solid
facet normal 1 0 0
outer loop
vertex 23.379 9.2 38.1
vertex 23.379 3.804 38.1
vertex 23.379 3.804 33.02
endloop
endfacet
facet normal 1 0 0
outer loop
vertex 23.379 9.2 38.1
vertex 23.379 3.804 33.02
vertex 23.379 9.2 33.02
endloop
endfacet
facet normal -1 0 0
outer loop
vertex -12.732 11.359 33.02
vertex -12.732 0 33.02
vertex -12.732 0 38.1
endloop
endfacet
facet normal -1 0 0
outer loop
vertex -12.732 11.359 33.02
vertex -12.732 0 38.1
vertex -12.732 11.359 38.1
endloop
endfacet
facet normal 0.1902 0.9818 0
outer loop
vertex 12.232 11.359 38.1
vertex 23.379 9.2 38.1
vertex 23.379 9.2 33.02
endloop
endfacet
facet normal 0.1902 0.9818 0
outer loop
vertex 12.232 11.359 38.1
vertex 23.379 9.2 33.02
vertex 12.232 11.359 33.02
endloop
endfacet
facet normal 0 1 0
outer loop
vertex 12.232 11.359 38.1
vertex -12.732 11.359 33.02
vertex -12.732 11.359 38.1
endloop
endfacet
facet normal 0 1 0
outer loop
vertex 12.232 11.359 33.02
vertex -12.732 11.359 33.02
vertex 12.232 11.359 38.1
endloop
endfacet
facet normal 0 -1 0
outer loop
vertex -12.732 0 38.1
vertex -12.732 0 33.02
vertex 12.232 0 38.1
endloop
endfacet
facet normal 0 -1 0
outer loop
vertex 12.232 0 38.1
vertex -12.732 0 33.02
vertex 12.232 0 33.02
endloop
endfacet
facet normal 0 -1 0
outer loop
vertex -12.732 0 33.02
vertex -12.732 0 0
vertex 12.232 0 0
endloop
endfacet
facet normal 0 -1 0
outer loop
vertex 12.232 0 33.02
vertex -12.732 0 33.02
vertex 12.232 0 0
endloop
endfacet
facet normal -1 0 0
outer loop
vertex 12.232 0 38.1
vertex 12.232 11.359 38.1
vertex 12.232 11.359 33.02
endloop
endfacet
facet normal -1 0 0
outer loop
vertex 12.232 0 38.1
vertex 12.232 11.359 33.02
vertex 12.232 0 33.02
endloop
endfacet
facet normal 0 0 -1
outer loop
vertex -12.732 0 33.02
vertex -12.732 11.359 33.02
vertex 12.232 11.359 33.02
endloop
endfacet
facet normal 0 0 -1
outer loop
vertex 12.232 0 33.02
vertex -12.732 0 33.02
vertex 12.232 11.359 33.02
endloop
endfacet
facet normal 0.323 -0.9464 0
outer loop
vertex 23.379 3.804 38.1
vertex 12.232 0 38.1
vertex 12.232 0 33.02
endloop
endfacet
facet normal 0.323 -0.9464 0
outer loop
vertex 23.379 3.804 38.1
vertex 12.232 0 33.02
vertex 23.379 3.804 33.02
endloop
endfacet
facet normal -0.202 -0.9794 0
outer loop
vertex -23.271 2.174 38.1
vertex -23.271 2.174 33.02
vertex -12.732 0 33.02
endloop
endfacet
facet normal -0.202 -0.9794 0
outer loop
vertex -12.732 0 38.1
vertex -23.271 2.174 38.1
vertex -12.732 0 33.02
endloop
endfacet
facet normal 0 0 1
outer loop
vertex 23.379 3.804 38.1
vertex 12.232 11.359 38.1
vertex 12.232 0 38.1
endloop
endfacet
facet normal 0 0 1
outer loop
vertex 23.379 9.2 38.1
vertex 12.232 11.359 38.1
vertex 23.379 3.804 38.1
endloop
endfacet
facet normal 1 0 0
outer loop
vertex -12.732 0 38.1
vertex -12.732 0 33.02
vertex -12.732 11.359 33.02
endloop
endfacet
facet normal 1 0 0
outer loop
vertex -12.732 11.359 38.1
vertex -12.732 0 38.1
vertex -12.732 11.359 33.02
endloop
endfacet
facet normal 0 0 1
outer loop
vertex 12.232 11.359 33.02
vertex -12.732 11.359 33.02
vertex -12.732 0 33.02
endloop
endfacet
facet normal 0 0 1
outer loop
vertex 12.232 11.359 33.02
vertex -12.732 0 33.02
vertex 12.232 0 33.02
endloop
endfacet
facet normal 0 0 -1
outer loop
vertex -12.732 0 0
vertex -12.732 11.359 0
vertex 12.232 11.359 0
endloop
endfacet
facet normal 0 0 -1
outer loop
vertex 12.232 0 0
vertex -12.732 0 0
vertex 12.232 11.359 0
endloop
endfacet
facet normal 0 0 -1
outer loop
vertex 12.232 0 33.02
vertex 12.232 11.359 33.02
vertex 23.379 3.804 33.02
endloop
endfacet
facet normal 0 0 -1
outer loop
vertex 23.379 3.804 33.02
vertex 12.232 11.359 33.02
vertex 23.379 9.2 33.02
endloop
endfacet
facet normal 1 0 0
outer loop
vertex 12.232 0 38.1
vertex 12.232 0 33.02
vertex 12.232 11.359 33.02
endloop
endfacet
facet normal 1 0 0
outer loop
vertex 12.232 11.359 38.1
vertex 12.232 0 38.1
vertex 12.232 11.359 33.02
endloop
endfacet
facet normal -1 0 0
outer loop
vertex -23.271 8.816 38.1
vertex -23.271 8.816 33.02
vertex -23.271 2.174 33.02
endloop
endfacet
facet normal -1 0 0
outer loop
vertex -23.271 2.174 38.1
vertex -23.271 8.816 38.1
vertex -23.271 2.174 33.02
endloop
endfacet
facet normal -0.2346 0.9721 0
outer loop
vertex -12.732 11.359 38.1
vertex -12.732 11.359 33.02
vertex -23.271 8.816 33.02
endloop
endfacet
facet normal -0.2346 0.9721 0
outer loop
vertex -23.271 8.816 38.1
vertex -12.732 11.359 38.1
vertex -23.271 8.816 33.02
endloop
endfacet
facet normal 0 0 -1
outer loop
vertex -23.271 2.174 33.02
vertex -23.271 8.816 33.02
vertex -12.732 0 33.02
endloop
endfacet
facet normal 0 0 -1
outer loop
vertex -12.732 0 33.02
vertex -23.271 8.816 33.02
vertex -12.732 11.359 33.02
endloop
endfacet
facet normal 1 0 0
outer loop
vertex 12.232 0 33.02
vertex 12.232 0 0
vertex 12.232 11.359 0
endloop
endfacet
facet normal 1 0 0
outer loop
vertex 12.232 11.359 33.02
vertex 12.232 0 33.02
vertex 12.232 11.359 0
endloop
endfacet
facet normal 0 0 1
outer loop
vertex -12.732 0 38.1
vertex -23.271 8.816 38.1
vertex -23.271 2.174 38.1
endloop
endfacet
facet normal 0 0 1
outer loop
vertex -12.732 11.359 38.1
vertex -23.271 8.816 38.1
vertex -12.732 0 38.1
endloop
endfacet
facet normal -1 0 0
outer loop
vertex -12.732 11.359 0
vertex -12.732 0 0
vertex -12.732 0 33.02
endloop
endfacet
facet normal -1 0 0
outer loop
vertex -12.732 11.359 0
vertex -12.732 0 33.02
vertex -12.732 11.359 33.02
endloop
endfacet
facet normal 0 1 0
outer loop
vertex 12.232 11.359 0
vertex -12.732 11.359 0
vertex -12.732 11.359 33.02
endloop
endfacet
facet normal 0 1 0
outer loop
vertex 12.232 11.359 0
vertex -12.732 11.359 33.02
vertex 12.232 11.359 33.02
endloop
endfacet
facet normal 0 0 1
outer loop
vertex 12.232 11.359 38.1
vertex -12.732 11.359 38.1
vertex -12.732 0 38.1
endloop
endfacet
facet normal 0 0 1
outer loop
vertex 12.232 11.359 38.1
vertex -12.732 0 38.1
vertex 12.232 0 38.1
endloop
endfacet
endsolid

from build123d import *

# Parameters (mm, degrees)
F0_W     = 24.964119
F0_H     = 11.358674
F1_DEPTH = 33.02
F3_DEPTH = 5.08
F4_W     = 24.964119
F4_H     = 11.358674
F5_DEPTH = 5.08
F7_DEPTH = 5.08


with BuildPart() as f1:
    # F0 (on Top) → F1 (new body)
    with BuildSketch(Plane.XY):
        with Locations((-0.24964, 5.679337)):
            Rectangle(F0_W, F0_H)
    extrude(amount=F1_DEPTH)


with BuildPart() as f3:
    # F2 (on face) → F3 (new body)
    with BuildSketch(Plane.XY.offset(33.02)):
        Polygon((-12.7317, 0), (-12.7317, 11.358674), (-23.270963, 8.816268), (-23.270963, 2.17388), align=None)
    extrude(amount=F3_DEPTH)


with BuildPart() as f5:
    # F4 (on face) → F5 (new body)
    with BuildSketch(Plane.XY.offset(33.02)):
        with Locations((-0.24964, 5.679337)):
            Rectangle(F4_W, F4_H)
    extrude(amount=F5_DEPTH)


with BuildPart() as f7:
    # F6 (on face) → F7 (new body)
    with BuildSketch(Plane.XY.offset(38.1)):
        Polygon((23.378788, 9.200462), (12.232419, 11.358674), (12.232419, 0), (23.378788, 3.803569), align=None)
    extrude(amount=-F7_DEPTH)


solid = Compound([f1.part, f3.part, f5.part, f7.part])
